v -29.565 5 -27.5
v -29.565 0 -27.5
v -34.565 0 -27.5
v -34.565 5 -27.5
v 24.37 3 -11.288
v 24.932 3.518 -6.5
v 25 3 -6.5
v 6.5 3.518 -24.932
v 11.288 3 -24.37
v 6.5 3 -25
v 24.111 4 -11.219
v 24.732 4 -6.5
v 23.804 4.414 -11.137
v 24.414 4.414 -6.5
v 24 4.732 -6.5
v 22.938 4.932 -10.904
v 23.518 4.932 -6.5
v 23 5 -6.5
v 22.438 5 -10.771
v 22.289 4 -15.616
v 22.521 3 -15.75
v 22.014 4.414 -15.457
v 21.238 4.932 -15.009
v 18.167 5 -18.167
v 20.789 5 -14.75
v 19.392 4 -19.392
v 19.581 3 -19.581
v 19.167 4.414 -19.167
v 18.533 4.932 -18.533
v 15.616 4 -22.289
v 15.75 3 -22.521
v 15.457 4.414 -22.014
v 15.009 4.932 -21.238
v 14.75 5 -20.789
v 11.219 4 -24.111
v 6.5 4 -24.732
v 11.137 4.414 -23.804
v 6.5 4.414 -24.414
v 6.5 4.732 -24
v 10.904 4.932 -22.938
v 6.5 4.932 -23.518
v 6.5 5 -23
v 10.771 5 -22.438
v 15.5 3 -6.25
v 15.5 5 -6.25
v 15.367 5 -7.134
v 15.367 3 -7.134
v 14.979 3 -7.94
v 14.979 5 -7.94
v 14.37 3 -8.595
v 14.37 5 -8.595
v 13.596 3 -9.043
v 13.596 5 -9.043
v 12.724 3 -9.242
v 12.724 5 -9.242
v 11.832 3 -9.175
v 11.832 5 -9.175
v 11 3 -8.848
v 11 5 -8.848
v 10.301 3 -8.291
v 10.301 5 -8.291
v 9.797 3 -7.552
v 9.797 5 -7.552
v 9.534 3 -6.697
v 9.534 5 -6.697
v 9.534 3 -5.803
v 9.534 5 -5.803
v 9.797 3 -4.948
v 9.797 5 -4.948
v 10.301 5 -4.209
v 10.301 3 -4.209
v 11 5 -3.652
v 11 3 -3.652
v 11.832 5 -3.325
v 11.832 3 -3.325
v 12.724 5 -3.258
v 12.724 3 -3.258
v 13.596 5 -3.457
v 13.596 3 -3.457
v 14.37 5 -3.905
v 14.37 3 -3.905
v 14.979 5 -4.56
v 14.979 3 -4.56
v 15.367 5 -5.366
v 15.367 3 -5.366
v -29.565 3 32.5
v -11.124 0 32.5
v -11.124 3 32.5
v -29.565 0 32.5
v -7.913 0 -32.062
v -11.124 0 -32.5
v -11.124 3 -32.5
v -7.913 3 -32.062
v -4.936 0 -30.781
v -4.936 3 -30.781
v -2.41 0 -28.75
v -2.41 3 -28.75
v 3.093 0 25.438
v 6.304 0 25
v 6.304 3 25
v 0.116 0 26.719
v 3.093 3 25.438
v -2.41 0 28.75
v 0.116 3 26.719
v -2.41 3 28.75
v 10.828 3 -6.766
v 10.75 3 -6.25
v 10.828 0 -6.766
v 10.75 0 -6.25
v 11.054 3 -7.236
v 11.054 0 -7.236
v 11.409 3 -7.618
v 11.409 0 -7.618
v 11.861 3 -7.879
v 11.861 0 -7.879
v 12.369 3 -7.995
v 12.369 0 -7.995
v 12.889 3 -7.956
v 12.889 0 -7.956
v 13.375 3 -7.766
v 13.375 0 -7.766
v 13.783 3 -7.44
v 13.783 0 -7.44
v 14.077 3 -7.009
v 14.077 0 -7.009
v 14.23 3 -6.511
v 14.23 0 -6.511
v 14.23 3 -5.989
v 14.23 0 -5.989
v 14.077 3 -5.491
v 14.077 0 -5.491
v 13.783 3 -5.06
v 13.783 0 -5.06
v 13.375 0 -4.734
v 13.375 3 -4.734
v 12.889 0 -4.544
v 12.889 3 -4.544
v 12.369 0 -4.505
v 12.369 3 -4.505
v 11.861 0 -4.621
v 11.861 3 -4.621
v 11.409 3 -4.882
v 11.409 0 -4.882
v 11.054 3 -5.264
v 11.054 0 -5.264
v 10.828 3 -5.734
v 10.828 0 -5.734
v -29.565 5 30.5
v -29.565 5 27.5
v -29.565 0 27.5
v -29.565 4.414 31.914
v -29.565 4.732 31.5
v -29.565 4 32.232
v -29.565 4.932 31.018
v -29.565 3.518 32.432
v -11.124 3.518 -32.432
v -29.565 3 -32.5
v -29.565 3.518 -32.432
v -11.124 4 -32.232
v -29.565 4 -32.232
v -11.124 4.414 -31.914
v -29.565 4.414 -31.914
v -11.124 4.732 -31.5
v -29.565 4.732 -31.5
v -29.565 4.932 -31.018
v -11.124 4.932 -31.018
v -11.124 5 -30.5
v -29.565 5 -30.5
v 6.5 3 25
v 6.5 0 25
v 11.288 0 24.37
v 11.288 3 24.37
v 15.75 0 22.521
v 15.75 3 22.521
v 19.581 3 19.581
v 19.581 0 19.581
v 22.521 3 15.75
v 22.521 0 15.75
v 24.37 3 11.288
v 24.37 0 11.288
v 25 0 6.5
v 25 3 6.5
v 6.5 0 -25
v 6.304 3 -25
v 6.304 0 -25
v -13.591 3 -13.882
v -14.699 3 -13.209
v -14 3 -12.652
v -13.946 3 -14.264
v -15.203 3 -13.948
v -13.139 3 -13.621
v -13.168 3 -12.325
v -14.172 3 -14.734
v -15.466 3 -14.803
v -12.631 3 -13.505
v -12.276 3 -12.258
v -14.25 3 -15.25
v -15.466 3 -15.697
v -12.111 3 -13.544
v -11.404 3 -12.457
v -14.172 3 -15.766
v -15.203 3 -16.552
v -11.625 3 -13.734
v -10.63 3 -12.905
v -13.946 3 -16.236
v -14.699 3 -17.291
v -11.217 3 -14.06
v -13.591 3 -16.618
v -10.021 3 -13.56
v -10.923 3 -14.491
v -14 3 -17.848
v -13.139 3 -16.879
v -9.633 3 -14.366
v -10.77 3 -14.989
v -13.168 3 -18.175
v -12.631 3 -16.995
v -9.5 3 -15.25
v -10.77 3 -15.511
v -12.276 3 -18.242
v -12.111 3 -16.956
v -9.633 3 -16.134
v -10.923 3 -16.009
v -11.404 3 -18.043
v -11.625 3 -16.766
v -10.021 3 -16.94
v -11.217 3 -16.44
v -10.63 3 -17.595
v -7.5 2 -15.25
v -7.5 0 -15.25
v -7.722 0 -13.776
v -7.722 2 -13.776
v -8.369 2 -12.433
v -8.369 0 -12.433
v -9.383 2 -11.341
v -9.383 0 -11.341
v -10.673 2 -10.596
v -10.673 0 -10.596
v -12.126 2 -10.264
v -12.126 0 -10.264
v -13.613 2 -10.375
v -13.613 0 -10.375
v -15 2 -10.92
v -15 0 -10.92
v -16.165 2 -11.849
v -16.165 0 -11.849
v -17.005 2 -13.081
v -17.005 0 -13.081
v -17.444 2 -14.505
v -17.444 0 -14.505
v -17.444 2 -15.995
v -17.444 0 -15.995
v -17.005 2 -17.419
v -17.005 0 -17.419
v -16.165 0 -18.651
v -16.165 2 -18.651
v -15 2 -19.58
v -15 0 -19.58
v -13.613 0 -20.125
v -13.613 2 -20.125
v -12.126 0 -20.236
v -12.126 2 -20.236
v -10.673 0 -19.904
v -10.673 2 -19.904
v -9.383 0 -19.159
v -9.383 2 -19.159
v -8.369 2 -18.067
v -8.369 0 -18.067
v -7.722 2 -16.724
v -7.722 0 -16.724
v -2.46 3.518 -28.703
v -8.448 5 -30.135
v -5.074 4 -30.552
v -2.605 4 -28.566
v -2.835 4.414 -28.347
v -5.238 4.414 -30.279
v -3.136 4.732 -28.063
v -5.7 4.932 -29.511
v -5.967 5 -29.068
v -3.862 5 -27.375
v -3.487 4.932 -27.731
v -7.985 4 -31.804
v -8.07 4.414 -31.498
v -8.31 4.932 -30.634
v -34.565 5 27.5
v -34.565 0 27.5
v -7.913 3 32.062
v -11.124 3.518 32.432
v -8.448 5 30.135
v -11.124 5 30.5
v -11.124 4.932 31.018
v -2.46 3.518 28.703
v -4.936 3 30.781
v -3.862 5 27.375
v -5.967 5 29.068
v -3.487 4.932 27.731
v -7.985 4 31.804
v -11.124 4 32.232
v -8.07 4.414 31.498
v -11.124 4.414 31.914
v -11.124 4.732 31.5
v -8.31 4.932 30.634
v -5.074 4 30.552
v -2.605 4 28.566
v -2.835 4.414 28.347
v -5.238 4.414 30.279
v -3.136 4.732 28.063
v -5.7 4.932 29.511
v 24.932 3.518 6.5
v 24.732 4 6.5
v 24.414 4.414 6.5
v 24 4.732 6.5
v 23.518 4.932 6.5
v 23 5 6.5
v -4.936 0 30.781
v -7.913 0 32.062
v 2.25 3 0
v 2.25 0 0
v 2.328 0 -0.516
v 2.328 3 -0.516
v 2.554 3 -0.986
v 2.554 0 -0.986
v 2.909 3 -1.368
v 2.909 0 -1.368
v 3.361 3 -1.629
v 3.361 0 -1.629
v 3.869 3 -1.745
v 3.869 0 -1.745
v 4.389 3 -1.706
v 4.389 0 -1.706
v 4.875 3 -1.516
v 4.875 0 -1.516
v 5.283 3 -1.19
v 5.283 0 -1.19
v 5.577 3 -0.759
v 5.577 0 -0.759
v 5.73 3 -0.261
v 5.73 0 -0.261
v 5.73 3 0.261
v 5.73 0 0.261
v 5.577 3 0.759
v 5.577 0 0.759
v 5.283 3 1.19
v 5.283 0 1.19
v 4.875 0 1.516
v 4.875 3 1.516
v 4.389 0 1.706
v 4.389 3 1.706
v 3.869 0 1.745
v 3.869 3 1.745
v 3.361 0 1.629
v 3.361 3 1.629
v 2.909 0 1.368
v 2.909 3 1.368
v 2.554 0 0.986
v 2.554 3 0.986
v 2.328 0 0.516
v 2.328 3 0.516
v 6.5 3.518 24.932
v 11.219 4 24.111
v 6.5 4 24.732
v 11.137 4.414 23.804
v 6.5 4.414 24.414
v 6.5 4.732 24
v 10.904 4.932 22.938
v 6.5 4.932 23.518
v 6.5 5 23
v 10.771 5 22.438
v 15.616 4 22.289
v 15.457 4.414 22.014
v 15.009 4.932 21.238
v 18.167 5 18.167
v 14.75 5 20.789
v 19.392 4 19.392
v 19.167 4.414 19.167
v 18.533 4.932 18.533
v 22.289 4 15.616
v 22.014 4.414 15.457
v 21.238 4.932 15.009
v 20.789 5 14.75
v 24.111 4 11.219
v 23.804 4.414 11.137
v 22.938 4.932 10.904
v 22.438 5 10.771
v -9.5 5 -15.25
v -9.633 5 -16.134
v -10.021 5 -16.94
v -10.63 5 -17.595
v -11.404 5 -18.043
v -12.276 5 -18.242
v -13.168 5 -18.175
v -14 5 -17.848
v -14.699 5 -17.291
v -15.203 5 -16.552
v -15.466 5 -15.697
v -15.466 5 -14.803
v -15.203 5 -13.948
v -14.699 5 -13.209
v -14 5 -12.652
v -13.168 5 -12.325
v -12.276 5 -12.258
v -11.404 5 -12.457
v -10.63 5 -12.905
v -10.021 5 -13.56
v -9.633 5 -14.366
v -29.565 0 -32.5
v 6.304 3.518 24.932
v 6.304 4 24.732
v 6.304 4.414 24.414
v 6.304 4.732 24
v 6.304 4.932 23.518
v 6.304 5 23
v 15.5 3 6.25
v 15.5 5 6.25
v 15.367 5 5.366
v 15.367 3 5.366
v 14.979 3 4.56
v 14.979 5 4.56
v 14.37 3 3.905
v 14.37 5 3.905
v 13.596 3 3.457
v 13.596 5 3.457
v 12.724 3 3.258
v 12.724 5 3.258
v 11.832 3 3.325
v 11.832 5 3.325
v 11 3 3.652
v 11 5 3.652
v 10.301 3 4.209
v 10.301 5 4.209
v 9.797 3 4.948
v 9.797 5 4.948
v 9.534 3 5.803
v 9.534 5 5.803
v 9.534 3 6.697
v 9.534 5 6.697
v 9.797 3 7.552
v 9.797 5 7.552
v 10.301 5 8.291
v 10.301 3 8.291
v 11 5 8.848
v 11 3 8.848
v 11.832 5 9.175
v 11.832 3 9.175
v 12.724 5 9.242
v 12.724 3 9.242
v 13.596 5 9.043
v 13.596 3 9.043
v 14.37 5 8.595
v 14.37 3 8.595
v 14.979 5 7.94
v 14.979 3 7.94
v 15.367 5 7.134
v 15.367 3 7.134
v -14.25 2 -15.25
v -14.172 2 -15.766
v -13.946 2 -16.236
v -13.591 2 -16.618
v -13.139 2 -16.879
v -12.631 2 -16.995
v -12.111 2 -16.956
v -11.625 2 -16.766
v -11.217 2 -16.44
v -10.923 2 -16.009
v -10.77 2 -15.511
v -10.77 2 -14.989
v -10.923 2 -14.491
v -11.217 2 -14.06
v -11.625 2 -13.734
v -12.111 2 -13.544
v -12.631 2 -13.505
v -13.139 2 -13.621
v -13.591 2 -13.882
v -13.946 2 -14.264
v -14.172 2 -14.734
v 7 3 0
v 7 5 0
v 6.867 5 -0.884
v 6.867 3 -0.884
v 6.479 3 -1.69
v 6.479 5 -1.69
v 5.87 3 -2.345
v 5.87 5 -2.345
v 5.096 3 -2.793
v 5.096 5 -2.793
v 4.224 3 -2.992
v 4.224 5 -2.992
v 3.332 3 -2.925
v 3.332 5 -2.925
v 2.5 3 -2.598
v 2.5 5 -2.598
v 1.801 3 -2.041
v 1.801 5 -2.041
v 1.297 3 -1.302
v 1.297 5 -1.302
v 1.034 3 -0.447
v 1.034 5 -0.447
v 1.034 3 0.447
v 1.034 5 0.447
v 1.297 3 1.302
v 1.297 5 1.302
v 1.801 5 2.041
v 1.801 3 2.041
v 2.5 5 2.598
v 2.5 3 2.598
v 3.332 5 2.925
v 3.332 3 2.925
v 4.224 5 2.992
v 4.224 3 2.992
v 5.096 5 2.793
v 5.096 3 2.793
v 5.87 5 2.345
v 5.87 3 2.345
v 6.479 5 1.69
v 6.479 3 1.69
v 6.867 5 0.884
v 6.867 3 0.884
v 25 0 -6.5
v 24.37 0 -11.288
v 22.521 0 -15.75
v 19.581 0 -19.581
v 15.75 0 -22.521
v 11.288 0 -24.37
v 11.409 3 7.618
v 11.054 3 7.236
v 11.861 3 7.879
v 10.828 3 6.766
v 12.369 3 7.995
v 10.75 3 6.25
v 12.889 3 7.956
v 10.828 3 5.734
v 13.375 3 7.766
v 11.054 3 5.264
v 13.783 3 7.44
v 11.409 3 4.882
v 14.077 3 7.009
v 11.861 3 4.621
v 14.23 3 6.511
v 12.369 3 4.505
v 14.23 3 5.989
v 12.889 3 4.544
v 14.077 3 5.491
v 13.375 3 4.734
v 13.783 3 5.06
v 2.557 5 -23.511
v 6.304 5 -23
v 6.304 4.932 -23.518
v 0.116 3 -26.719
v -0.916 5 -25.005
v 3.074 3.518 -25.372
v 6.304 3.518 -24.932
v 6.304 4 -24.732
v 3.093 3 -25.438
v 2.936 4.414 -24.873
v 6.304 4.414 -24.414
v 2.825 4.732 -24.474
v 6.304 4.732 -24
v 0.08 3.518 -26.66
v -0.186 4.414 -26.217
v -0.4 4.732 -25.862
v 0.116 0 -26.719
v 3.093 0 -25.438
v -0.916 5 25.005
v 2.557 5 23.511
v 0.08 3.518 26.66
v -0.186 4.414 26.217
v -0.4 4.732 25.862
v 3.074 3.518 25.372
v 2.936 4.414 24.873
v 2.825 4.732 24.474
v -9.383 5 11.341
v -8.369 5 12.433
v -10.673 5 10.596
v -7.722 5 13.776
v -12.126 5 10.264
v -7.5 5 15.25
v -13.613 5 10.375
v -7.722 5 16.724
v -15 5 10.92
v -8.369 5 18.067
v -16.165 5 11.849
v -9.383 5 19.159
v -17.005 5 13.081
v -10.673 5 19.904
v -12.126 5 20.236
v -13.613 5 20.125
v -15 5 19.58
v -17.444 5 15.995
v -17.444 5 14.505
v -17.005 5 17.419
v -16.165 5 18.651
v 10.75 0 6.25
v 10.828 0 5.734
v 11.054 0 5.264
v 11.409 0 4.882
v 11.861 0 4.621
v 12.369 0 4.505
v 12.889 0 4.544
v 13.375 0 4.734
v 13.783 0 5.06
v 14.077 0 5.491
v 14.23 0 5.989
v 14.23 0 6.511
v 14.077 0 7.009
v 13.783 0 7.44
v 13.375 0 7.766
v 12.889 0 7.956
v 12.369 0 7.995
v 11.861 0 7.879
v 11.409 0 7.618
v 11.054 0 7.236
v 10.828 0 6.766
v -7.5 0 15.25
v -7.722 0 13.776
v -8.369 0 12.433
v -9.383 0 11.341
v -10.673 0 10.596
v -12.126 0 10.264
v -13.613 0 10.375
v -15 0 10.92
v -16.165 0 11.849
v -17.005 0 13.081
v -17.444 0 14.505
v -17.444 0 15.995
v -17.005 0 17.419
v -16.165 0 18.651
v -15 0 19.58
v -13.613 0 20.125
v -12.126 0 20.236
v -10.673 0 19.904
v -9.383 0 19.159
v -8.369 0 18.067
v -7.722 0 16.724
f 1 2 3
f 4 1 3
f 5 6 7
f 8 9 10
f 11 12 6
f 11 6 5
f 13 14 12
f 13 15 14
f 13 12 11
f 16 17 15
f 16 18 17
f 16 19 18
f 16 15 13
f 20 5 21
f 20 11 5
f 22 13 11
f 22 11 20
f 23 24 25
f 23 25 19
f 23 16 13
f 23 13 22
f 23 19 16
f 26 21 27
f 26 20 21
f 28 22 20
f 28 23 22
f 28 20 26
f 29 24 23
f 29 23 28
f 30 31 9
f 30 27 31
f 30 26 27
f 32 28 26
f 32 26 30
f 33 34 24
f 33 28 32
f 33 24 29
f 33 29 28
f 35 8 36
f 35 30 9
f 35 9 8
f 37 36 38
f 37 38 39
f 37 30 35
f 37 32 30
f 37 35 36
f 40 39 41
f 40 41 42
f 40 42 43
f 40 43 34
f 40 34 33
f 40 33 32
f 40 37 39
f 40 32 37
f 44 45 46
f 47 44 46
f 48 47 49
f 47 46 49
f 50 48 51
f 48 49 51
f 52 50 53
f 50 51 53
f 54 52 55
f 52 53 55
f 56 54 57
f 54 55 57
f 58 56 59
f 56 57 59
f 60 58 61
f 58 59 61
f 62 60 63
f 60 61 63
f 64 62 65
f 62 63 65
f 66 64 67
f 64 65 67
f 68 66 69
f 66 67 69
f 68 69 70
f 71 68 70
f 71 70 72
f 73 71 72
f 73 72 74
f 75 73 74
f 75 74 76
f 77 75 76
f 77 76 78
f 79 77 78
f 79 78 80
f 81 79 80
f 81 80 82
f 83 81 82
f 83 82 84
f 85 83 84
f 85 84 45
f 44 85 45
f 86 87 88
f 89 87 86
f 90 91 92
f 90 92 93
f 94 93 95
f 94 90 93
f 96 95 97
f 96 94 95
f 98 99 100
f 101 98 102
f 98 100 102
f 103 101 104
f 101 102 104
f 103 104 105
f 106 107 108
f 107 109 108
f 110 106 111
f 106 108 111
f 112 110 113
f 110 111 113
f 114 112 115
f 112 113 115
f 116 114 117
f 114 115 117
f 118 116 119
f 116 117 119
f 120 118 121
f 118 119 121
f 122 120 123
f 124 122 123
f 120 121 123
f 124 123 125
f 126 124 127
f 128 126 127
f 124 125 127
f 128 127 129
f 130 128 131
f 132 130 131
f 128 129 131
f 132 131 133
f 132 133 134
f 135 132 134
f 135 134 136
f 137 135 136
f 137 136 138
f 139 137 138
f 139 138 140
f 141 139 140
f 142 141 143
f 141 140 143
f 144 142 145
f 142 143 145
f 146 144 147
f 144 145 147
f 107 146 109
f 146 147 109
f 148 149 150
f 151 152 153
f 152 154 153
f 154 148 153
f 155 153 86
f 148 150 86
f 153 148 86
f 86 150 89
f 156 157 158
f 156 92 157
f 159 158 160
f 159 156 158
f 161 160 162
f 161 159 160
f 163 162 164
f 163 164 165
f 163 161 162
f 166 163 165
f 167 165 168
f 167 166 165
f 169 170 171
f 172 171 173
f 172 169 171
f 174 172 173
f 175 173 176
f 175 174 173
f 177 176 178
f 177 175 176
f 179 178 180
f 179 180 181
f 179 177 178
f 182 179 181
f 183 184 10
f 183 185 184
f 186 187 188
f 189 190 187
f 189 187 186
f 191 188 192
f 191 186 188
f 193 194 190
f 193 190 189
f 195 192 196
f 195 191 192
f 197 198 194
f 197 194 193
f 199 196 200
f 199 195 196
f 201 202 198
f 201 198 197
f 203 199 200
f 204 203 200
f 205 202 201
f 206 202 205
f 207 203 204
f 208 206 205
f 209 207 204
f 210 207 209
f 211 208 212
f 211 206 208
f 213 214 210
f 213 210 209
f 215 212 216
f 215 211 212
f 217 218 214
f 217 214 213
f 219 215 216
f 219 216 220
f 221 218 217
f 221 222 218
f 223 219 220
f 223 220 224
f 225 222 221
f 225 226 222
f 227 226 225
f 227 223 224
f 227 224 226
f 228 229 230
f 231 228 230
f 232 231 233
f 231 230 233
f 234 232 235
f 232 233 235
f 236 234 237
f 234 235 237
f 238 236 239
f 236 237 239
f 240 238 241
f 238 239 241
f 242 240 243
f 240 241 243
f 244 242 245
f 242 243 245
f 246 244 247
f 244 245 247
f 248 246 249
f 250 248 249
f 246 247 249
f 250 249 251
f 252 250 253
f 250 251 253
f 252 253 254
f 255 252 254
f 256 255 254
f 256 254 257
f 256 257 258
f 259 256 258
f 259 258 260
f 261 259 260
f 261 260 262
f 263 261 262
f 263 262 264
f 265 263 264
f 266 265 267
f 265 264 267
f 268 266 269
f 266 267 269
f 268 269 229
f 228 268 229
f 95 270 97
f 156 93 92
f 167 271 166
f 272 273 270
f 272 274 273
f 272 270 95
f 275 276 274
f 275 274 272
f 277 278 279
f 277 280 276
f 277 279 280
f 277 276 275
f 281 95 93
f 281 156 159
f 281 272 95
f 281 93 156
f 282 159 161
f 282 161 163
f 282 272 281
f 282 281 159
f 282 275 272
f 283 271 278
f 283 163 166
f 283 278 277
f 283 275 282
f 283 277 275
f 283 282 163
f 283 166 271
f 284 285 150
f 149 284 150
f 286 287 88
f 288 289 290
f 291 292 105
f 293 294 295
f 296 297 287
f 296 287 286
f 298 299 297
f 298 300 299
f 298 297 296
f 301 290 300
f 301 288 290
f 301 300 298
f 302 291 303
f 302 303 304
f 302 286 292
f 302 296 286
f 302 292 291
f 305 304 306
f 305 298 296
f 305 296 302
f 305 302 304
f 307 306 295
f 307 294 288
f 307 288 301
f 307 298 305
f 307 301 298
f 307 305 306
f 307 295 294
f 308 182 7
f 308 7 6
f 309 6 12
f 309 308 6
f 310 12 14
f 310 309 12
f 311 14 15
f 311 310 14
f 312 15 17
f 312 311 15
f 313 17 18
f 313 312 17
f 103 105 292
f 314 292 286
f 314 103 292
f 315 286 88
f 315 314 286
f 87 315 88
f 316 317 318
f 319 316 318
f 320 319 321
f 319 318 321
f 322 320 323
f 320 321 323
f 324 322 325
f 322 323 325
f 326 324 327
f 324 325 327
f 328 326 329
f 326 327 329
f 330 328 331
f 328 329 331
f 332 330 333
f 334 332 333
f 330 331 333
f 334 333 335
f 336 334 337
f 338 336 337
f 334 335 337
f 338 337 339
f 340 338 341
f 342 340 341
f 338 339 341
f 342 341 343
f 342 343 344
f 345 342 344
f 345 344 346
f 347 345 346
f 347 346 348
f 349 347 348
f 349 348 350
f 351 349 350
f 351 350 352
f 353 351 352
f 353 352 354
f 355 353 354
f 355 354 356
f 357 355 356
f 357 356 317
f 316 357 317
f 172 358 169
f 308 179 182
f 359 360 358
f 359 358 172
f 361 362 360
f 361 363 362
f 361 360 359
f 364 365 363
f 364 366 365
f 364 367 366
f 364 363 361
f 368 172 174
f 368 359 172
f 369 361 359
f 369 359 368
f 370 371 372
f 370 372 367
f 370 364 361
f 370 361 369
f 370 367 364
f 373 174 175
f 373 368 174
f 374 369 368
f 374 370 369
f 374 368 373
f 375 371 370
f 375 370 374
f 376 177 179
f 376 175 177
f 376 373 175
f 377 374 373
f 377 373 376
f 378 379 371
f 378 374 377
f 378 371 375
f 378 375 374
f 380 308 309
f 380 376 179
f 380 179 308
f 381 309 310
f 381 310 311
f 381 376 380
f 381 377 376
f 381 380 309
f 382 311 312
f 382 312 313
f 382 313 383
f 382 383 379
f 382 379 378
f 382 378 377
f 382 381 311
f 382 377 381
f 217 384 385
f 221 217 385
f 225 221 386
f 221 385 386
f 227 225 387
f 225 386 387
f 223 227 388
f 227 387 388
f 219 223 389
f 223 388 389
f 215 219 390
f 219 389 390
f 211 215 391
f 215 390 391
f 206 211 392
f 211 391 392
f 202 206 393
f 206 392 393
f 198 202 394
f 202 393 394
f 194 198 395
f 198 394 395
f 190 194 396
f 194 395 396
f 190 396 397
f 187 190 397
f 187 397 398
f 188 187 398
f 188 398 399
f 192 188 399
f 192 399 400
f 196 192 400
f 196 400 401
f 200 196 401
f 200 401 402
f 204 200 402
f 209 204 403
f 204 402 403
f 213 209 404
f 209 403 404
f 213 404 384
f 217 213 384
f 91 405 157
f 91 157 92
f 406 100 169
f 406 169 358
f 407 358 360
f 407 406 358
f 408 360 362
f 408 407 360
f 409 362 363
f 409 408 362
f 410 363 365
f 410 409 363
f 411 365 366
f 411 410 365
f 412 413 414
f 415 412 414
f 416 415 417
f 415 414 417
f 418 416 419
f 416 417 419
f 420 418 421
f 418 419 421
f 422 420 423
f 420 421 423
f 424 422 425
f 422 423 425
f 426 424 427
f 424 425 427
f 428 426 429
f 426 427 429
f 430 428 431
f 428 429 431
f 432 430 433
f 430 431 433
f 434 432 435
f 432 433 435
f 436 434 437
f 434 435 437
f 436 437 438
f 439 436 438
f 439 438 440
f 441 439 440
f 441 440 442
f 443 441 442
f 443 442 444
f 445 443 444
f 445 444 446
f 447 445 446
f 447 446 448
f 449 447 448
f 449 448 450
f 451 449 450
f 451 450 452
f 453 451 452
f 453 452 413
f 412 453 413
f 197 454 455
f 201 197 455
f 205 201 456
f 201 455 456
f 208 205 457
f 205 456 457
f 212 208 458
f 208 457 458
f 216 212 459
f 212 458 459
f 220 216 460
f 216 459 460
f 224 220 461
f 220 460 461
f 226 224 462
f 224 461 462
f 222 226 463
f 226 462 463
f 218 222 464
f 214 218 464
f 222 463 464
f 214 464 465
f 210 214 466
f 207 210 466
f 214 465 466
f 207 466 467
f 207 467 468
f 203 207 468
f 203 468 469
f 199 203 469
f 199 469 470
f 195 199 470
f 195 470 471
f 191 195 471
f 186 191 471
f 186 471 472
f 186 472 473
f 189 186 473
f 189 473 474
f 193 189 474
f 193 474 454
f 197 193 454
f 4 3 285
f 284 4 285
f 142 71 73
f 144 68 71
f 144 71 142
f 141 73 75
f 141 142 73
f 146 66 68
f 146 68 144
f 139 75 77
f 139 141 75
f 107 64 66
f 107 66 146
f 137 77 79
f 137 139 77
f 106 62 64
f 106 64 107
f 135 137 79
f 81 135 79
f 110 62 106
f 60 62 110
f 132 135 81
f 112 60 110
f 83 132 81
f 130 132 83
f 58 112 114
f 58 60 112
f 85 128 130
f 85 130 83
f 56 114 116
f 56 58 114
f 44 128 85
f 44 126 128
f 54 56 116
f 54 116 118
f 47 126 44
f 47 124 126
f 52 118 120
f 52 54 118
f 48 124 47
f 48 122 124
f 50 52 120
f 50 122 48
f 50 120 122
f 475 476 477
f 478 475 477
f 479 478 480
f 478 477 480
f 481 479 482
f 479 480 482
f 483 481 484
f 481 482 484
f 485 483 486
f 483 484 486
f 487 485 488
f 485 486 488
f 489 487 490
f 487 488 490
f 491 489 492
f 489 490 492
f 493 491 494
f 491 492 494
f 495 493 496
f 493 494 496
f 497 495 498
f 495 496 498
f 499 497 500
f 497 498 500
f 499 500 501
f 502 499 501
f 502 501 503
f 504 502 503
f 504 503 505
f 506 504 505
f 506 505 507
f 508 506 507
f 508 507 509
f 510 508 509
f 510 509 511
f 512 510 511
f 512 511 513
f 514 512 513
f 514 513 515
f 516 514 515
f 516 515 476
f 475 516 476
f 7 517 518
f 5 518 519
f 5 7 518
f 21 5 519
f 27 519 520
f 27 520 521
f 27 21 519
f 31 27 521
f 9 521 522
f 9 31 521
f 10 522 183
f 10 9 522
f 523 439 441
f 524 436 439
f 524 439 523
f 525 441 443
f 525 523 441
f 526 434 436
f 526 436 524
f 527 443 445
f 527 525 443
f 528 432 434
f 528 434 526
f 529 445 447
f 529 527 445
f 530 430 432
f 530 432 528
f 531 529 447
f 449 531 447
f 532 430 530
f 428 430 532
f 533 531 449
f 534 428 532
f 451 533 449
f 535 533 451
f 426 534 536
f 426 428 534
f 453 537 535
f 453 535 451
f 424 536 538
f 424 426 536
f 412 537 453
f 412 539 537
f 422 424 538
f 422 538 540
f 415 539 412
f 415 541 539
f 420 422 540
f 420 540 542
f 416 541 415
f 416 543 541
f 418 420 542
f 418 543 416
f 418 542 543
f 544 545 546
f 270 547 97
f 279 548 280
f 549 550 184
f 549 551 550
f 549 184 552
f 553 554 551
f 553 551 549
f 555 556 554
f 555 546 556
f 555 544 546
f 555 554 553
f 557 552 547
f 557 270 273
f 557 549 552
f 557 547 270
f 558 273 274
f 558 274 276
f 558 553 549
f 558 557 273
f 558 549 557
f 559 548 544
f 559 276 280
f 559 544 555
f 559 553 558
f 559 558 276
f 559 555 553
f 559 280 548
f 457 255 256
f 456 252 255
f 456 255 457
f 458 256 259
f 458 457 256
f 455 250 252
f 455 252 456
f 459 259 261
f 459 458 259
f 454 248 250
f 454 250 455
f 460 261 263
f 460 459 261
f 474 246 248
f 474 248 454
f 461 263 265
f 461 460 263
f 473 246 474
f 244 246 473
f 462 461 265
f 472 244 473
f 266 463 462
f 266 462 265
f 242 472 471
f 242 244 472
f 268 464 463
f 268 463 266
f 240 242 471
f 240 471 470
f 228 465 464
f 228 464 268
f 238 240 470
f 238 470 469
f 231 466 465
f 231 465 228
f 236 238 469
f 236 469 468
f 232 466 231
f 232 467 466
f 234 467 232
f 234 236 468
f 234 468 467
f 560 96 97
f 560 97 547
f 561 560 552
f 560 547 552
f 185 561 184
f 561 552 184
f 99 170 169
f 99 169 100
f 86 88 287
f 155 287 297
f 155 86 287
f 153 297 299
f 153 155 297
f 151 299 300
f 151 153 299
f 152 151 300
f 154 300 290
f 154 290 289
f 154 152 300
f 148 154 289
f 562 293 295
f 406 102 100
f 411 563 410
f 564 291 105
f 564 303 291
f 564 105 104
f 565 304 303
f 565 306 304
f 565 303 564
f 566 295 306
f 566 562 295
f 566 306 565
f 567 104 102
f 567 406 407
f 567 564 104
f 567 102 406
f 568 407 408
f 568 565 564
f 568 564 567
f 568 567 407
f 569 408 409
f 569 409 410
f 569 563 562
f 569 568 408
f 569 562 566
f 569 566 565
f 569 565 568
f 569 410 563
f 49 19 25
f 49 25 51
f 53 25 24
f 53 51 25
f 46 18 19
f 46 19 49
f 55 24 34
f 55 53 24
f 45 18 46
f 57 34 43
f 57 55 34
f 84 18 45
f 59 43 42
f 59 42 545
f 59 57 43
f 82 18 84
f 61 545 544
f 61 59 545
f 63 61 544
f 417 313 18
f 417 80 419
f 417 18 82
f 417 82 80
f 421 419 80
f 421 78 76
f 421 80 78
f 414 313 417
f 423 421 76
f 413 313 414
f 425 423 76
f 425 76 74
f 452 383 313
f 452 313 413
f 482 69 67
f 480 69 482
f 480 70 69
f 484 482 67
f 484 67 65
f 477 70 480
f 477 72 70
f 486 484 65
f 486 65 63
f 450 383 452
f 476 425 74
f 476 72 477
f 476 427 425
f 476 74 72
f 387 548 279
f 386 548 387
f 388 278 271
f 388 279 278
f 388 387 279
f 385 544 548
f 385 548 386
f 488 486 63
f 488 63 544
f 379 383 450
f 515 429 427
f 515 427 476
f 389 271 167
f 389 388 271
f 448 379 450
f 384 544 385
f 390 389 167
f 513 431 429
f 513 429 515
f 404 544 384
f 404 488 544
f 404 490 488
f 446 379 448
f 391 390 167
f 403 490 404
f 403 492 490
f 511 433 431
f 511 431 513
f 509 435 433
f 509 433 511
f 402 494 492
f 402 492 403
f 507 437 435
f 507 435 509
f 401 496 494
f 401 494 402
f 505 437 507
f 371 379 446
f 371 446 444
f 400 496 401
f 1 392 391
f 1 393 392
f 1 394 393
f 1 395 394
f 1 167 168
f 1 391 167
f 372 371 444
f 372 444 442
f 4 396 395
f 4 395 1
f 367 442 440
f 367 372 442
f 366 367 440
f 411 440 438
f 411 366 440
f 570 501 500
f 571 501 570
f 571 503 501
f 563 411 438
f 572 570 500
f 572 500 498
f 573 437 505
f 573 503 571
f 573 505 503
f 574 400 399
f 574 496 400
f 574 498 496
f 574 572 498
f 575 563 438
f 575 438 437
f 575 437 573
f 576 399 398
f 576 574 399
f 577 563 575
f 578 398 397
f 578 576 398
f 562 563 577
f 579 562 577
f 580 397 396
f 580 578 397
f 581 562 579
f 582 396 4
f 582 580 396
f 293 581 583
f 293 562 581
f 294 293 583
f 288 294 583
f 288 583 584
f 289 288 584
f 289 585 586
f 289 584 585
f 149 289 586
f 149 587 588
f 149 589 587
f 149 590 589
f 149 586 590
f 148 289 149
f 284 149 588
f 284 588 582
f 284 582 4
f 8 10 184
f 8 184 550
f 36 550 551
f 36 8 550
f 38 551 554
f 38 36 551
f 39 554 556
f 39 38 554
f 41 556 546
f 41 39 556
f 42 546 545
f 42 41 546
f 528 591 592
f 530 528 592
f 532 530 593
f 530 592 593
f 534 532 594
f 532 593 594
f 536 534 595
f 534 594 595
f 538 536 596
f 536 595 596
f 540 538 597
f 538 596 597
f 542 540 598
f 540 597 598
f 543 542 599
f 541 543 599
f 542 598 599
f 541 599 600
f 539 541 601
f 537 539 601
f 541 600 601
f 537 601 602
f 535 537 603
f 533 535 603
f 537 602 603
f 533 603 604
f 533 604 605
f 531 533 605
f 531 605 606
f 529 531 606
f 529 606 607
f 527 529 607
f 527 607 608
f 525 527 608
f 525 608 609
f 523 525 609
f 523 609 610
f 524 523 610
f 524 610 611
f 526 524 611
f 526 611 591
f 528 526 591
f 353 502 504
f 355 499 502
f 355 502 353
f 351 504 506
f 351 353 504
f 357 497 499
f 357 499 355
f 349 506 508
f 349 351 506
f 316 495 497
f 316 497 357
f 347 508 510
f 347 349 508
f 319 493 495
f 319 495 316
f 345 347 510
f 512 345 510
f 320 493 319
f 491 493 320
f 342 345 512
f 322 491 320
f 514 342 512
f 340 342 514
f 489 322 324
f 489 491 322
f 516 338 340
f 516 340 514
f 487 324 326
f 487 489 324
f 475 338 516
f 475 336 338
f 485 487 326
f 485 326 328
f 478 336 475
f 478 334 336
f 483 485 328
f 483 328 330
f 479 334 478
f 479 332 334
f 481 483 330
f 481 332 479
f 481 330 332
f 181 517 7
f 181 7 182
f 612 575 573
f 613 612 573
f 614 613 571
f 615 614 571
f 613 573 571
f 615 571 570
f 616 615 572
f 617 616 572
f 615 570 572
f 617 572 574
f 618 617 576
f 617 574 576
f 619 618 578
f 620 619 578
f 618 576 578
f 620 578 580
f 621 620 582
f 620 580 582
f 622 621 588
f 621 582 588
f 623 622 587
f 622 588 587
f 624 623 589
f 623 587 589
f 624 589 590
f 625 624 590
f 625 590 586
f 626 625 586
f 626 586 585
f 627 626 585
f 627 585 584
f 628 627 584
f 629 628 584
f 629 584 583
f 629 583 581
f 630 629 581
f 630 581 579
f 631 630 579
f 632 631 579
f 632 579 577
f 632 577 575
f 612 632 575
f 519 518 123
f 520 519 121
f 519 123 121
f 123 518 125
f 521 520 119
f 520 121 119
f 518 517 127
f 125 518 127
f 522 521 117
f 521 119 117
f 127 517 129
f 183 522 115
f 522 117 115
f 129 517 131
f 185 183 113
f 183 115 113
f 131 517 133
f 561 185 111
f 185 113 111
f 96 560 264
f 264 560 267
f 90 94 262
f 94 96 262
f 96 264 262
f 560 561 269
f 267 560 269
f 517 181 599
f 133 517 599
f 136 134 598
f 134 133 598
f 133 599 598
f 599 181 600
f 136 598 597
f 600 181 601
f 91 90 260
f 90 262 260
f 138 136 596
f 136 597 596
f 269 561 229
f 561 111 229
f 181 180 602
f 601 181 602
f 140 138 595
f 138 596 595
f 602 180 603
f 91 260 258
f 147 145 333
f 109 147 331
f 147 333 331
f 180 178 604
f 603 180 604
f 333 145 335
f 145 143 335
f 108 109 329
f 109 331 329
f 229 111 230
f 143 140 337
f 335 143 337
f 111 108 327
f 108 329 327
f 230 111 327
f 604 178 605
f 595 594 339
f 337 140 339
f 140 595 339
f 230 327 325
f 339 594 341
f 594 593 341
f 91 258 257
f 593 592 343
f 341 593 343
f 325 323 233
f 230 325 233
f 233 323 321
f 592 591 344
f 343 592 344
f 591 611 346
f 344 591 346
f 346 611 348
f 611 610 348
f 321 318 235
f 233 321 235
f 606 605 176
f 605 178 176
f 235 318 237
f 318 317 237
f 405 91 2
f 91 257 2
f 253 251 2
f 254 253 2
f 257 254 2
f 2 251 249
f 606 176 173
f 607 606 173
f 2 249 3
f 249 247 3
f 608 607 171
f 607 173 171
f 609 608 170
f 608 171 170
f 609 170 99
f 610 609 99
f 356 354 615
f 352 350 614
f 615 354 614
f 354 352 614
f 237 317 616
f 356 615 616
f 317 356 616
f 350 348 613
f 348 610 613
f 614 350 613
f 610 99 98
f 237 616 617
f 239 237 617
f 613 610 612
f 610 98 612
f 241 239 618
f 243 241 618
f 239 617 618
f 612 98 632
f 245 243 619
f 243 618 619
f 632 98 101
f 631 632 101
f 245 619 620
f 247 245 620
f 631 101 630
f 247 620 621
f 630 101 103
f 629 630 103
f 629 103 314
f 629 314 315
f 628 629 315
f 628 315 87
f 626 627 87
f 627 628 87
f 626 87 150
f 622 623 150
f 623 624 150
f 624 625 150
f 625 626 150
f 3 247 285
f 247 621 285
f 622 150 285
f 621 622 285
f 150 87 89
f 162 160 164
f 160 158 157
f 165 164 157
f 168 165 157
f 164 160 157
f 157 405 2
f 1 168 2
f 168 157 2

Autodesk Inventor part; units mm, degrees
ref_plane "YZ Plane" through (0, 0, 0) normal (1, 0, 0) x (0, 1, 0)
ref_plane "XZ Plane" through (0, 0, 0) normal (0, 1, 0) x (-1, 0, 0)
ref_plane "XY Plane" through (0, 0, 0) normal (0, 0, 1) x (1, 0, 0)
sketch "Sketch1" plane through (0, 0, 0) normal (0, 1, 0) x (-1, 0, 0)
  line L0 (-25, 25) -> (25, 25)
  line L1 (25, 25) -> (25, -25)
  line L2 (25, -25) -> (-25, -25)
  line L3 (-25, -25) -> (-25, 25)
  line L4 (-25, 25) -> (25, -25) construction
  line L5 (25, 25) -> (-25, -25) construction
  line L6 (25, 0) -> (-25, 0)
  circle A0 centre (12.5, 15.25) radius 1.75
  line L7 (-25, 12.5) -> (0, 12.5)
  line L8 (-12.5, 12.5) -> (-12.5, 0)
  circle A1 centre (-12.5, 6.25) radius 1.75
  line L9 (25, -25) -> (-25, 25) construction
  circle A2 centre (12.5, -15.25) radius 1.75
  circle A3 centre (-12.5, -6.25) radius 1.75
  line L10 (0, 32.5) -> (50, 32.5)
  line L11 (50, 32.5) -> (50, -32.5)
  line L12 (50, -32.5) -> (0, -32.5)
  line L13 (0, -32.5) -> (0, 32.5)
  line L14 (0, 32.5) -> (50, -32.5) construction
  line L15 (50, 32.5) -> (0, -32.5) construction
  line L16 (50, -32.5) -> (29.5652, -32.5)
  line L17 (29.5652, -32.5) -> (29.5652, 32.5)
  line L18 (29.5652, 32.5) -> (50, 32.5)
  line L19 (0, 32.5205) -> (0, -32.5)
  circle A4 centre (12.5, -15.25) radius 15
  line L20 (29.5652, -32.5) -> (39.5652, -32.5)
  line L21 (39.5652, -32.5) -> (39.5652, 32.5)
  line L22 (39.5652, 32.5) -> (29.5652, 32.5)
  line L23 (29.5652, 32.5) -> (29.5652, -32.5)
  line L24 (12.5, -15.25) -> (12.5, 0)
  line L25 (-12.5, -6.25) -> (12.5, -6.25)
  circle A5 centre (-4, 0) radius 5
  circle A6 centre (-4, 0) radius 1.75
  line L26 (0, 0) -> (-4, 0)
  line L27 (29.5652, -32.5) -> (29.5652, -27.5)
  line L28 (29.5652, -27.5) -> (34.5652, -27.5)
  line L29 (34.5652, -27.5) -> (34.5652, 27.5)
  line L30 (34.5652, 27.5) -> (29.5652, 27.5)
  line L31 (29.5652, 27.5) -> (29.5652, -27.5)
  point P0 (0, -12.5)
  point P1 (-12.5, -12.5)
  point P2 (0, 25)
  point P3 (0, -25)
  point P4 (0, 25)
  point P5 (0, -25)
  point P6 (0, 32.5)
  point P7 (0, 32.5)
  point P8 (0, -23.5416)
  point P9 (1.101, -25)
  point P10 (25, -23.5416)
  point P11 (23.899, -25)
  point P12 (39.5652, 32.5)
  point P13 (0, 0)
  dimension "d0" = 50
  dimension "d1" = 50
  dimension "d5" = 3.5
  dimension "d7" = 3.5
  dimension "d11" = 15.25
  dimension "d12" = 50
  dimension "d13" = 65
  dimension "d19" = 30
  dimension "d21" = 10
  dimension "d27" = 7.5
  dimension "d28" = 7.5
  dimension "d31" = 9
  dimension "d32" = 25
  dimension "d57" = 10
  dimension "d58" = 3.5
  dimension "d59" = 4
  dimension "d60" = 5
  dimension "d61" = 55
extrude "Extrusion3" add sketch "Sketch1" along normal blind 5 contours L0 L13 L7 L3 | L13 L10 L17 L12 L2 A4 L1 L0 | L0 L1 L6 A5 L13 | L7 L8 A1 L6 L3 | L13 A5 L6 L8 A1 L7 | L6 A5 L13 A4 L2 L3 | L1 A4 L24 L6 | A5 L6 L13 | L13 L6 A6 A5 | A4 L1 | L1 A4 L2 L13 L25 L24 | L24 A4 L25 L13 A5 L6 | L13 A5 L6 A6 | L6 A5 L13 | L30 L29 L28 L17 | L13 A4 L2 | L1 L2 A4 | L24 L25 A4 | L2 A4 | A4 L13 | A4 L13 L25 | A0
fillet "Fillet5" radius 12 2 edges at (0, 2.5, 32.5) (0, 2.5, -32.5)
fillet "Fillet6" radius 12 2 edges at (0, 2.5, 25) (0, 2.5, -25)
fillet "Fillet7" radius 18.5 2 edges at (25, 2.5, 25) (25, 2.5, -25)
sketch "Sketch5" plane through (0, 5, 0) normal (0, 1, 0) x (1, 0, 0)
  circle A0 centre (-12.5, 15.25) radius 1.75 projected
  circle A1 centre (-12.5, -15.25) radius 1.5 projected
  circle A2 centre (-12.5, -15.25) radius 5
  circle A3 centre (4, 0) radius 1.75 projected
  circle A4 centre (4, 0) radius 3
  circle A5 centre (12.5, 6.25) radius 1.75 projected
  circle A6 centre (12.5, 6.25) radius 3
  circle A7 centre (12.5, -6.25) radius 1.75 projected
  circle A8 centre (12.5, -6.25) radius 3
  circle A9 centre (-12.5, 15.25) radius 3
  point P0 (0, 0)
  dimension "d63" = 6
  dimension "d64" = 6
  dimension "d65" = 6
  dimension "d71" = 10
  dimension "d75" = 6
extrude "Extrusion8" cut sketch "Sketch5" against normal blind 2 contours A3 | A4 | A5 | A6 | A7 | A8
fillet "Fillet9" radius 2 11 edges at (6.4021, 5, 25) (1.5607, 5, 25.9773) (-6.3809, 5, 31.5227) (-20.3448, 5, 32.5) (25, 5, 0) (19.5815, 5, -19.5815) (6.4021, 5, -25) (1.5607, 5, -25.9773) (-6.3809, 5, -31.5227) (-20.3448, 5, -32.5) (19.5815, 5, 19.5815)
extrude "Extrusion9" cut sketch "Sketch5" against normal through all contours A1 | A2
sketch "Sketch6" plane through (0, 0, 0) normal (0, -1, 0) x (1, 0, 0)
  circle A0 centre (-12.5, -15.25) radius 1.75 projected
  circle A1 centre (-12.5, -15.25) radius 5
  point P0 (0, 0)
  dimension "d72" = 10
extrude "Extrusion10" cut sketch "Sketch6" against normal blind 2
extrude "Extrusion11" cut sketch "Sketch5" against normal blind 2 contours A0 | A9
sketch "Sketch7" plane through (0, 0, 0) normal (0, -1, 0) x (1, 0, 0)
  circle A0 centre (-12.5, 15.25) radius 5 projected
  circle A1 centre (-12.5, -15.25) radius 5 projected
  point P0 (0, 0)
  point P1 (-12.5, 20.25)
  point P2 (-12.5, -20.25)
properties part number "Top"
